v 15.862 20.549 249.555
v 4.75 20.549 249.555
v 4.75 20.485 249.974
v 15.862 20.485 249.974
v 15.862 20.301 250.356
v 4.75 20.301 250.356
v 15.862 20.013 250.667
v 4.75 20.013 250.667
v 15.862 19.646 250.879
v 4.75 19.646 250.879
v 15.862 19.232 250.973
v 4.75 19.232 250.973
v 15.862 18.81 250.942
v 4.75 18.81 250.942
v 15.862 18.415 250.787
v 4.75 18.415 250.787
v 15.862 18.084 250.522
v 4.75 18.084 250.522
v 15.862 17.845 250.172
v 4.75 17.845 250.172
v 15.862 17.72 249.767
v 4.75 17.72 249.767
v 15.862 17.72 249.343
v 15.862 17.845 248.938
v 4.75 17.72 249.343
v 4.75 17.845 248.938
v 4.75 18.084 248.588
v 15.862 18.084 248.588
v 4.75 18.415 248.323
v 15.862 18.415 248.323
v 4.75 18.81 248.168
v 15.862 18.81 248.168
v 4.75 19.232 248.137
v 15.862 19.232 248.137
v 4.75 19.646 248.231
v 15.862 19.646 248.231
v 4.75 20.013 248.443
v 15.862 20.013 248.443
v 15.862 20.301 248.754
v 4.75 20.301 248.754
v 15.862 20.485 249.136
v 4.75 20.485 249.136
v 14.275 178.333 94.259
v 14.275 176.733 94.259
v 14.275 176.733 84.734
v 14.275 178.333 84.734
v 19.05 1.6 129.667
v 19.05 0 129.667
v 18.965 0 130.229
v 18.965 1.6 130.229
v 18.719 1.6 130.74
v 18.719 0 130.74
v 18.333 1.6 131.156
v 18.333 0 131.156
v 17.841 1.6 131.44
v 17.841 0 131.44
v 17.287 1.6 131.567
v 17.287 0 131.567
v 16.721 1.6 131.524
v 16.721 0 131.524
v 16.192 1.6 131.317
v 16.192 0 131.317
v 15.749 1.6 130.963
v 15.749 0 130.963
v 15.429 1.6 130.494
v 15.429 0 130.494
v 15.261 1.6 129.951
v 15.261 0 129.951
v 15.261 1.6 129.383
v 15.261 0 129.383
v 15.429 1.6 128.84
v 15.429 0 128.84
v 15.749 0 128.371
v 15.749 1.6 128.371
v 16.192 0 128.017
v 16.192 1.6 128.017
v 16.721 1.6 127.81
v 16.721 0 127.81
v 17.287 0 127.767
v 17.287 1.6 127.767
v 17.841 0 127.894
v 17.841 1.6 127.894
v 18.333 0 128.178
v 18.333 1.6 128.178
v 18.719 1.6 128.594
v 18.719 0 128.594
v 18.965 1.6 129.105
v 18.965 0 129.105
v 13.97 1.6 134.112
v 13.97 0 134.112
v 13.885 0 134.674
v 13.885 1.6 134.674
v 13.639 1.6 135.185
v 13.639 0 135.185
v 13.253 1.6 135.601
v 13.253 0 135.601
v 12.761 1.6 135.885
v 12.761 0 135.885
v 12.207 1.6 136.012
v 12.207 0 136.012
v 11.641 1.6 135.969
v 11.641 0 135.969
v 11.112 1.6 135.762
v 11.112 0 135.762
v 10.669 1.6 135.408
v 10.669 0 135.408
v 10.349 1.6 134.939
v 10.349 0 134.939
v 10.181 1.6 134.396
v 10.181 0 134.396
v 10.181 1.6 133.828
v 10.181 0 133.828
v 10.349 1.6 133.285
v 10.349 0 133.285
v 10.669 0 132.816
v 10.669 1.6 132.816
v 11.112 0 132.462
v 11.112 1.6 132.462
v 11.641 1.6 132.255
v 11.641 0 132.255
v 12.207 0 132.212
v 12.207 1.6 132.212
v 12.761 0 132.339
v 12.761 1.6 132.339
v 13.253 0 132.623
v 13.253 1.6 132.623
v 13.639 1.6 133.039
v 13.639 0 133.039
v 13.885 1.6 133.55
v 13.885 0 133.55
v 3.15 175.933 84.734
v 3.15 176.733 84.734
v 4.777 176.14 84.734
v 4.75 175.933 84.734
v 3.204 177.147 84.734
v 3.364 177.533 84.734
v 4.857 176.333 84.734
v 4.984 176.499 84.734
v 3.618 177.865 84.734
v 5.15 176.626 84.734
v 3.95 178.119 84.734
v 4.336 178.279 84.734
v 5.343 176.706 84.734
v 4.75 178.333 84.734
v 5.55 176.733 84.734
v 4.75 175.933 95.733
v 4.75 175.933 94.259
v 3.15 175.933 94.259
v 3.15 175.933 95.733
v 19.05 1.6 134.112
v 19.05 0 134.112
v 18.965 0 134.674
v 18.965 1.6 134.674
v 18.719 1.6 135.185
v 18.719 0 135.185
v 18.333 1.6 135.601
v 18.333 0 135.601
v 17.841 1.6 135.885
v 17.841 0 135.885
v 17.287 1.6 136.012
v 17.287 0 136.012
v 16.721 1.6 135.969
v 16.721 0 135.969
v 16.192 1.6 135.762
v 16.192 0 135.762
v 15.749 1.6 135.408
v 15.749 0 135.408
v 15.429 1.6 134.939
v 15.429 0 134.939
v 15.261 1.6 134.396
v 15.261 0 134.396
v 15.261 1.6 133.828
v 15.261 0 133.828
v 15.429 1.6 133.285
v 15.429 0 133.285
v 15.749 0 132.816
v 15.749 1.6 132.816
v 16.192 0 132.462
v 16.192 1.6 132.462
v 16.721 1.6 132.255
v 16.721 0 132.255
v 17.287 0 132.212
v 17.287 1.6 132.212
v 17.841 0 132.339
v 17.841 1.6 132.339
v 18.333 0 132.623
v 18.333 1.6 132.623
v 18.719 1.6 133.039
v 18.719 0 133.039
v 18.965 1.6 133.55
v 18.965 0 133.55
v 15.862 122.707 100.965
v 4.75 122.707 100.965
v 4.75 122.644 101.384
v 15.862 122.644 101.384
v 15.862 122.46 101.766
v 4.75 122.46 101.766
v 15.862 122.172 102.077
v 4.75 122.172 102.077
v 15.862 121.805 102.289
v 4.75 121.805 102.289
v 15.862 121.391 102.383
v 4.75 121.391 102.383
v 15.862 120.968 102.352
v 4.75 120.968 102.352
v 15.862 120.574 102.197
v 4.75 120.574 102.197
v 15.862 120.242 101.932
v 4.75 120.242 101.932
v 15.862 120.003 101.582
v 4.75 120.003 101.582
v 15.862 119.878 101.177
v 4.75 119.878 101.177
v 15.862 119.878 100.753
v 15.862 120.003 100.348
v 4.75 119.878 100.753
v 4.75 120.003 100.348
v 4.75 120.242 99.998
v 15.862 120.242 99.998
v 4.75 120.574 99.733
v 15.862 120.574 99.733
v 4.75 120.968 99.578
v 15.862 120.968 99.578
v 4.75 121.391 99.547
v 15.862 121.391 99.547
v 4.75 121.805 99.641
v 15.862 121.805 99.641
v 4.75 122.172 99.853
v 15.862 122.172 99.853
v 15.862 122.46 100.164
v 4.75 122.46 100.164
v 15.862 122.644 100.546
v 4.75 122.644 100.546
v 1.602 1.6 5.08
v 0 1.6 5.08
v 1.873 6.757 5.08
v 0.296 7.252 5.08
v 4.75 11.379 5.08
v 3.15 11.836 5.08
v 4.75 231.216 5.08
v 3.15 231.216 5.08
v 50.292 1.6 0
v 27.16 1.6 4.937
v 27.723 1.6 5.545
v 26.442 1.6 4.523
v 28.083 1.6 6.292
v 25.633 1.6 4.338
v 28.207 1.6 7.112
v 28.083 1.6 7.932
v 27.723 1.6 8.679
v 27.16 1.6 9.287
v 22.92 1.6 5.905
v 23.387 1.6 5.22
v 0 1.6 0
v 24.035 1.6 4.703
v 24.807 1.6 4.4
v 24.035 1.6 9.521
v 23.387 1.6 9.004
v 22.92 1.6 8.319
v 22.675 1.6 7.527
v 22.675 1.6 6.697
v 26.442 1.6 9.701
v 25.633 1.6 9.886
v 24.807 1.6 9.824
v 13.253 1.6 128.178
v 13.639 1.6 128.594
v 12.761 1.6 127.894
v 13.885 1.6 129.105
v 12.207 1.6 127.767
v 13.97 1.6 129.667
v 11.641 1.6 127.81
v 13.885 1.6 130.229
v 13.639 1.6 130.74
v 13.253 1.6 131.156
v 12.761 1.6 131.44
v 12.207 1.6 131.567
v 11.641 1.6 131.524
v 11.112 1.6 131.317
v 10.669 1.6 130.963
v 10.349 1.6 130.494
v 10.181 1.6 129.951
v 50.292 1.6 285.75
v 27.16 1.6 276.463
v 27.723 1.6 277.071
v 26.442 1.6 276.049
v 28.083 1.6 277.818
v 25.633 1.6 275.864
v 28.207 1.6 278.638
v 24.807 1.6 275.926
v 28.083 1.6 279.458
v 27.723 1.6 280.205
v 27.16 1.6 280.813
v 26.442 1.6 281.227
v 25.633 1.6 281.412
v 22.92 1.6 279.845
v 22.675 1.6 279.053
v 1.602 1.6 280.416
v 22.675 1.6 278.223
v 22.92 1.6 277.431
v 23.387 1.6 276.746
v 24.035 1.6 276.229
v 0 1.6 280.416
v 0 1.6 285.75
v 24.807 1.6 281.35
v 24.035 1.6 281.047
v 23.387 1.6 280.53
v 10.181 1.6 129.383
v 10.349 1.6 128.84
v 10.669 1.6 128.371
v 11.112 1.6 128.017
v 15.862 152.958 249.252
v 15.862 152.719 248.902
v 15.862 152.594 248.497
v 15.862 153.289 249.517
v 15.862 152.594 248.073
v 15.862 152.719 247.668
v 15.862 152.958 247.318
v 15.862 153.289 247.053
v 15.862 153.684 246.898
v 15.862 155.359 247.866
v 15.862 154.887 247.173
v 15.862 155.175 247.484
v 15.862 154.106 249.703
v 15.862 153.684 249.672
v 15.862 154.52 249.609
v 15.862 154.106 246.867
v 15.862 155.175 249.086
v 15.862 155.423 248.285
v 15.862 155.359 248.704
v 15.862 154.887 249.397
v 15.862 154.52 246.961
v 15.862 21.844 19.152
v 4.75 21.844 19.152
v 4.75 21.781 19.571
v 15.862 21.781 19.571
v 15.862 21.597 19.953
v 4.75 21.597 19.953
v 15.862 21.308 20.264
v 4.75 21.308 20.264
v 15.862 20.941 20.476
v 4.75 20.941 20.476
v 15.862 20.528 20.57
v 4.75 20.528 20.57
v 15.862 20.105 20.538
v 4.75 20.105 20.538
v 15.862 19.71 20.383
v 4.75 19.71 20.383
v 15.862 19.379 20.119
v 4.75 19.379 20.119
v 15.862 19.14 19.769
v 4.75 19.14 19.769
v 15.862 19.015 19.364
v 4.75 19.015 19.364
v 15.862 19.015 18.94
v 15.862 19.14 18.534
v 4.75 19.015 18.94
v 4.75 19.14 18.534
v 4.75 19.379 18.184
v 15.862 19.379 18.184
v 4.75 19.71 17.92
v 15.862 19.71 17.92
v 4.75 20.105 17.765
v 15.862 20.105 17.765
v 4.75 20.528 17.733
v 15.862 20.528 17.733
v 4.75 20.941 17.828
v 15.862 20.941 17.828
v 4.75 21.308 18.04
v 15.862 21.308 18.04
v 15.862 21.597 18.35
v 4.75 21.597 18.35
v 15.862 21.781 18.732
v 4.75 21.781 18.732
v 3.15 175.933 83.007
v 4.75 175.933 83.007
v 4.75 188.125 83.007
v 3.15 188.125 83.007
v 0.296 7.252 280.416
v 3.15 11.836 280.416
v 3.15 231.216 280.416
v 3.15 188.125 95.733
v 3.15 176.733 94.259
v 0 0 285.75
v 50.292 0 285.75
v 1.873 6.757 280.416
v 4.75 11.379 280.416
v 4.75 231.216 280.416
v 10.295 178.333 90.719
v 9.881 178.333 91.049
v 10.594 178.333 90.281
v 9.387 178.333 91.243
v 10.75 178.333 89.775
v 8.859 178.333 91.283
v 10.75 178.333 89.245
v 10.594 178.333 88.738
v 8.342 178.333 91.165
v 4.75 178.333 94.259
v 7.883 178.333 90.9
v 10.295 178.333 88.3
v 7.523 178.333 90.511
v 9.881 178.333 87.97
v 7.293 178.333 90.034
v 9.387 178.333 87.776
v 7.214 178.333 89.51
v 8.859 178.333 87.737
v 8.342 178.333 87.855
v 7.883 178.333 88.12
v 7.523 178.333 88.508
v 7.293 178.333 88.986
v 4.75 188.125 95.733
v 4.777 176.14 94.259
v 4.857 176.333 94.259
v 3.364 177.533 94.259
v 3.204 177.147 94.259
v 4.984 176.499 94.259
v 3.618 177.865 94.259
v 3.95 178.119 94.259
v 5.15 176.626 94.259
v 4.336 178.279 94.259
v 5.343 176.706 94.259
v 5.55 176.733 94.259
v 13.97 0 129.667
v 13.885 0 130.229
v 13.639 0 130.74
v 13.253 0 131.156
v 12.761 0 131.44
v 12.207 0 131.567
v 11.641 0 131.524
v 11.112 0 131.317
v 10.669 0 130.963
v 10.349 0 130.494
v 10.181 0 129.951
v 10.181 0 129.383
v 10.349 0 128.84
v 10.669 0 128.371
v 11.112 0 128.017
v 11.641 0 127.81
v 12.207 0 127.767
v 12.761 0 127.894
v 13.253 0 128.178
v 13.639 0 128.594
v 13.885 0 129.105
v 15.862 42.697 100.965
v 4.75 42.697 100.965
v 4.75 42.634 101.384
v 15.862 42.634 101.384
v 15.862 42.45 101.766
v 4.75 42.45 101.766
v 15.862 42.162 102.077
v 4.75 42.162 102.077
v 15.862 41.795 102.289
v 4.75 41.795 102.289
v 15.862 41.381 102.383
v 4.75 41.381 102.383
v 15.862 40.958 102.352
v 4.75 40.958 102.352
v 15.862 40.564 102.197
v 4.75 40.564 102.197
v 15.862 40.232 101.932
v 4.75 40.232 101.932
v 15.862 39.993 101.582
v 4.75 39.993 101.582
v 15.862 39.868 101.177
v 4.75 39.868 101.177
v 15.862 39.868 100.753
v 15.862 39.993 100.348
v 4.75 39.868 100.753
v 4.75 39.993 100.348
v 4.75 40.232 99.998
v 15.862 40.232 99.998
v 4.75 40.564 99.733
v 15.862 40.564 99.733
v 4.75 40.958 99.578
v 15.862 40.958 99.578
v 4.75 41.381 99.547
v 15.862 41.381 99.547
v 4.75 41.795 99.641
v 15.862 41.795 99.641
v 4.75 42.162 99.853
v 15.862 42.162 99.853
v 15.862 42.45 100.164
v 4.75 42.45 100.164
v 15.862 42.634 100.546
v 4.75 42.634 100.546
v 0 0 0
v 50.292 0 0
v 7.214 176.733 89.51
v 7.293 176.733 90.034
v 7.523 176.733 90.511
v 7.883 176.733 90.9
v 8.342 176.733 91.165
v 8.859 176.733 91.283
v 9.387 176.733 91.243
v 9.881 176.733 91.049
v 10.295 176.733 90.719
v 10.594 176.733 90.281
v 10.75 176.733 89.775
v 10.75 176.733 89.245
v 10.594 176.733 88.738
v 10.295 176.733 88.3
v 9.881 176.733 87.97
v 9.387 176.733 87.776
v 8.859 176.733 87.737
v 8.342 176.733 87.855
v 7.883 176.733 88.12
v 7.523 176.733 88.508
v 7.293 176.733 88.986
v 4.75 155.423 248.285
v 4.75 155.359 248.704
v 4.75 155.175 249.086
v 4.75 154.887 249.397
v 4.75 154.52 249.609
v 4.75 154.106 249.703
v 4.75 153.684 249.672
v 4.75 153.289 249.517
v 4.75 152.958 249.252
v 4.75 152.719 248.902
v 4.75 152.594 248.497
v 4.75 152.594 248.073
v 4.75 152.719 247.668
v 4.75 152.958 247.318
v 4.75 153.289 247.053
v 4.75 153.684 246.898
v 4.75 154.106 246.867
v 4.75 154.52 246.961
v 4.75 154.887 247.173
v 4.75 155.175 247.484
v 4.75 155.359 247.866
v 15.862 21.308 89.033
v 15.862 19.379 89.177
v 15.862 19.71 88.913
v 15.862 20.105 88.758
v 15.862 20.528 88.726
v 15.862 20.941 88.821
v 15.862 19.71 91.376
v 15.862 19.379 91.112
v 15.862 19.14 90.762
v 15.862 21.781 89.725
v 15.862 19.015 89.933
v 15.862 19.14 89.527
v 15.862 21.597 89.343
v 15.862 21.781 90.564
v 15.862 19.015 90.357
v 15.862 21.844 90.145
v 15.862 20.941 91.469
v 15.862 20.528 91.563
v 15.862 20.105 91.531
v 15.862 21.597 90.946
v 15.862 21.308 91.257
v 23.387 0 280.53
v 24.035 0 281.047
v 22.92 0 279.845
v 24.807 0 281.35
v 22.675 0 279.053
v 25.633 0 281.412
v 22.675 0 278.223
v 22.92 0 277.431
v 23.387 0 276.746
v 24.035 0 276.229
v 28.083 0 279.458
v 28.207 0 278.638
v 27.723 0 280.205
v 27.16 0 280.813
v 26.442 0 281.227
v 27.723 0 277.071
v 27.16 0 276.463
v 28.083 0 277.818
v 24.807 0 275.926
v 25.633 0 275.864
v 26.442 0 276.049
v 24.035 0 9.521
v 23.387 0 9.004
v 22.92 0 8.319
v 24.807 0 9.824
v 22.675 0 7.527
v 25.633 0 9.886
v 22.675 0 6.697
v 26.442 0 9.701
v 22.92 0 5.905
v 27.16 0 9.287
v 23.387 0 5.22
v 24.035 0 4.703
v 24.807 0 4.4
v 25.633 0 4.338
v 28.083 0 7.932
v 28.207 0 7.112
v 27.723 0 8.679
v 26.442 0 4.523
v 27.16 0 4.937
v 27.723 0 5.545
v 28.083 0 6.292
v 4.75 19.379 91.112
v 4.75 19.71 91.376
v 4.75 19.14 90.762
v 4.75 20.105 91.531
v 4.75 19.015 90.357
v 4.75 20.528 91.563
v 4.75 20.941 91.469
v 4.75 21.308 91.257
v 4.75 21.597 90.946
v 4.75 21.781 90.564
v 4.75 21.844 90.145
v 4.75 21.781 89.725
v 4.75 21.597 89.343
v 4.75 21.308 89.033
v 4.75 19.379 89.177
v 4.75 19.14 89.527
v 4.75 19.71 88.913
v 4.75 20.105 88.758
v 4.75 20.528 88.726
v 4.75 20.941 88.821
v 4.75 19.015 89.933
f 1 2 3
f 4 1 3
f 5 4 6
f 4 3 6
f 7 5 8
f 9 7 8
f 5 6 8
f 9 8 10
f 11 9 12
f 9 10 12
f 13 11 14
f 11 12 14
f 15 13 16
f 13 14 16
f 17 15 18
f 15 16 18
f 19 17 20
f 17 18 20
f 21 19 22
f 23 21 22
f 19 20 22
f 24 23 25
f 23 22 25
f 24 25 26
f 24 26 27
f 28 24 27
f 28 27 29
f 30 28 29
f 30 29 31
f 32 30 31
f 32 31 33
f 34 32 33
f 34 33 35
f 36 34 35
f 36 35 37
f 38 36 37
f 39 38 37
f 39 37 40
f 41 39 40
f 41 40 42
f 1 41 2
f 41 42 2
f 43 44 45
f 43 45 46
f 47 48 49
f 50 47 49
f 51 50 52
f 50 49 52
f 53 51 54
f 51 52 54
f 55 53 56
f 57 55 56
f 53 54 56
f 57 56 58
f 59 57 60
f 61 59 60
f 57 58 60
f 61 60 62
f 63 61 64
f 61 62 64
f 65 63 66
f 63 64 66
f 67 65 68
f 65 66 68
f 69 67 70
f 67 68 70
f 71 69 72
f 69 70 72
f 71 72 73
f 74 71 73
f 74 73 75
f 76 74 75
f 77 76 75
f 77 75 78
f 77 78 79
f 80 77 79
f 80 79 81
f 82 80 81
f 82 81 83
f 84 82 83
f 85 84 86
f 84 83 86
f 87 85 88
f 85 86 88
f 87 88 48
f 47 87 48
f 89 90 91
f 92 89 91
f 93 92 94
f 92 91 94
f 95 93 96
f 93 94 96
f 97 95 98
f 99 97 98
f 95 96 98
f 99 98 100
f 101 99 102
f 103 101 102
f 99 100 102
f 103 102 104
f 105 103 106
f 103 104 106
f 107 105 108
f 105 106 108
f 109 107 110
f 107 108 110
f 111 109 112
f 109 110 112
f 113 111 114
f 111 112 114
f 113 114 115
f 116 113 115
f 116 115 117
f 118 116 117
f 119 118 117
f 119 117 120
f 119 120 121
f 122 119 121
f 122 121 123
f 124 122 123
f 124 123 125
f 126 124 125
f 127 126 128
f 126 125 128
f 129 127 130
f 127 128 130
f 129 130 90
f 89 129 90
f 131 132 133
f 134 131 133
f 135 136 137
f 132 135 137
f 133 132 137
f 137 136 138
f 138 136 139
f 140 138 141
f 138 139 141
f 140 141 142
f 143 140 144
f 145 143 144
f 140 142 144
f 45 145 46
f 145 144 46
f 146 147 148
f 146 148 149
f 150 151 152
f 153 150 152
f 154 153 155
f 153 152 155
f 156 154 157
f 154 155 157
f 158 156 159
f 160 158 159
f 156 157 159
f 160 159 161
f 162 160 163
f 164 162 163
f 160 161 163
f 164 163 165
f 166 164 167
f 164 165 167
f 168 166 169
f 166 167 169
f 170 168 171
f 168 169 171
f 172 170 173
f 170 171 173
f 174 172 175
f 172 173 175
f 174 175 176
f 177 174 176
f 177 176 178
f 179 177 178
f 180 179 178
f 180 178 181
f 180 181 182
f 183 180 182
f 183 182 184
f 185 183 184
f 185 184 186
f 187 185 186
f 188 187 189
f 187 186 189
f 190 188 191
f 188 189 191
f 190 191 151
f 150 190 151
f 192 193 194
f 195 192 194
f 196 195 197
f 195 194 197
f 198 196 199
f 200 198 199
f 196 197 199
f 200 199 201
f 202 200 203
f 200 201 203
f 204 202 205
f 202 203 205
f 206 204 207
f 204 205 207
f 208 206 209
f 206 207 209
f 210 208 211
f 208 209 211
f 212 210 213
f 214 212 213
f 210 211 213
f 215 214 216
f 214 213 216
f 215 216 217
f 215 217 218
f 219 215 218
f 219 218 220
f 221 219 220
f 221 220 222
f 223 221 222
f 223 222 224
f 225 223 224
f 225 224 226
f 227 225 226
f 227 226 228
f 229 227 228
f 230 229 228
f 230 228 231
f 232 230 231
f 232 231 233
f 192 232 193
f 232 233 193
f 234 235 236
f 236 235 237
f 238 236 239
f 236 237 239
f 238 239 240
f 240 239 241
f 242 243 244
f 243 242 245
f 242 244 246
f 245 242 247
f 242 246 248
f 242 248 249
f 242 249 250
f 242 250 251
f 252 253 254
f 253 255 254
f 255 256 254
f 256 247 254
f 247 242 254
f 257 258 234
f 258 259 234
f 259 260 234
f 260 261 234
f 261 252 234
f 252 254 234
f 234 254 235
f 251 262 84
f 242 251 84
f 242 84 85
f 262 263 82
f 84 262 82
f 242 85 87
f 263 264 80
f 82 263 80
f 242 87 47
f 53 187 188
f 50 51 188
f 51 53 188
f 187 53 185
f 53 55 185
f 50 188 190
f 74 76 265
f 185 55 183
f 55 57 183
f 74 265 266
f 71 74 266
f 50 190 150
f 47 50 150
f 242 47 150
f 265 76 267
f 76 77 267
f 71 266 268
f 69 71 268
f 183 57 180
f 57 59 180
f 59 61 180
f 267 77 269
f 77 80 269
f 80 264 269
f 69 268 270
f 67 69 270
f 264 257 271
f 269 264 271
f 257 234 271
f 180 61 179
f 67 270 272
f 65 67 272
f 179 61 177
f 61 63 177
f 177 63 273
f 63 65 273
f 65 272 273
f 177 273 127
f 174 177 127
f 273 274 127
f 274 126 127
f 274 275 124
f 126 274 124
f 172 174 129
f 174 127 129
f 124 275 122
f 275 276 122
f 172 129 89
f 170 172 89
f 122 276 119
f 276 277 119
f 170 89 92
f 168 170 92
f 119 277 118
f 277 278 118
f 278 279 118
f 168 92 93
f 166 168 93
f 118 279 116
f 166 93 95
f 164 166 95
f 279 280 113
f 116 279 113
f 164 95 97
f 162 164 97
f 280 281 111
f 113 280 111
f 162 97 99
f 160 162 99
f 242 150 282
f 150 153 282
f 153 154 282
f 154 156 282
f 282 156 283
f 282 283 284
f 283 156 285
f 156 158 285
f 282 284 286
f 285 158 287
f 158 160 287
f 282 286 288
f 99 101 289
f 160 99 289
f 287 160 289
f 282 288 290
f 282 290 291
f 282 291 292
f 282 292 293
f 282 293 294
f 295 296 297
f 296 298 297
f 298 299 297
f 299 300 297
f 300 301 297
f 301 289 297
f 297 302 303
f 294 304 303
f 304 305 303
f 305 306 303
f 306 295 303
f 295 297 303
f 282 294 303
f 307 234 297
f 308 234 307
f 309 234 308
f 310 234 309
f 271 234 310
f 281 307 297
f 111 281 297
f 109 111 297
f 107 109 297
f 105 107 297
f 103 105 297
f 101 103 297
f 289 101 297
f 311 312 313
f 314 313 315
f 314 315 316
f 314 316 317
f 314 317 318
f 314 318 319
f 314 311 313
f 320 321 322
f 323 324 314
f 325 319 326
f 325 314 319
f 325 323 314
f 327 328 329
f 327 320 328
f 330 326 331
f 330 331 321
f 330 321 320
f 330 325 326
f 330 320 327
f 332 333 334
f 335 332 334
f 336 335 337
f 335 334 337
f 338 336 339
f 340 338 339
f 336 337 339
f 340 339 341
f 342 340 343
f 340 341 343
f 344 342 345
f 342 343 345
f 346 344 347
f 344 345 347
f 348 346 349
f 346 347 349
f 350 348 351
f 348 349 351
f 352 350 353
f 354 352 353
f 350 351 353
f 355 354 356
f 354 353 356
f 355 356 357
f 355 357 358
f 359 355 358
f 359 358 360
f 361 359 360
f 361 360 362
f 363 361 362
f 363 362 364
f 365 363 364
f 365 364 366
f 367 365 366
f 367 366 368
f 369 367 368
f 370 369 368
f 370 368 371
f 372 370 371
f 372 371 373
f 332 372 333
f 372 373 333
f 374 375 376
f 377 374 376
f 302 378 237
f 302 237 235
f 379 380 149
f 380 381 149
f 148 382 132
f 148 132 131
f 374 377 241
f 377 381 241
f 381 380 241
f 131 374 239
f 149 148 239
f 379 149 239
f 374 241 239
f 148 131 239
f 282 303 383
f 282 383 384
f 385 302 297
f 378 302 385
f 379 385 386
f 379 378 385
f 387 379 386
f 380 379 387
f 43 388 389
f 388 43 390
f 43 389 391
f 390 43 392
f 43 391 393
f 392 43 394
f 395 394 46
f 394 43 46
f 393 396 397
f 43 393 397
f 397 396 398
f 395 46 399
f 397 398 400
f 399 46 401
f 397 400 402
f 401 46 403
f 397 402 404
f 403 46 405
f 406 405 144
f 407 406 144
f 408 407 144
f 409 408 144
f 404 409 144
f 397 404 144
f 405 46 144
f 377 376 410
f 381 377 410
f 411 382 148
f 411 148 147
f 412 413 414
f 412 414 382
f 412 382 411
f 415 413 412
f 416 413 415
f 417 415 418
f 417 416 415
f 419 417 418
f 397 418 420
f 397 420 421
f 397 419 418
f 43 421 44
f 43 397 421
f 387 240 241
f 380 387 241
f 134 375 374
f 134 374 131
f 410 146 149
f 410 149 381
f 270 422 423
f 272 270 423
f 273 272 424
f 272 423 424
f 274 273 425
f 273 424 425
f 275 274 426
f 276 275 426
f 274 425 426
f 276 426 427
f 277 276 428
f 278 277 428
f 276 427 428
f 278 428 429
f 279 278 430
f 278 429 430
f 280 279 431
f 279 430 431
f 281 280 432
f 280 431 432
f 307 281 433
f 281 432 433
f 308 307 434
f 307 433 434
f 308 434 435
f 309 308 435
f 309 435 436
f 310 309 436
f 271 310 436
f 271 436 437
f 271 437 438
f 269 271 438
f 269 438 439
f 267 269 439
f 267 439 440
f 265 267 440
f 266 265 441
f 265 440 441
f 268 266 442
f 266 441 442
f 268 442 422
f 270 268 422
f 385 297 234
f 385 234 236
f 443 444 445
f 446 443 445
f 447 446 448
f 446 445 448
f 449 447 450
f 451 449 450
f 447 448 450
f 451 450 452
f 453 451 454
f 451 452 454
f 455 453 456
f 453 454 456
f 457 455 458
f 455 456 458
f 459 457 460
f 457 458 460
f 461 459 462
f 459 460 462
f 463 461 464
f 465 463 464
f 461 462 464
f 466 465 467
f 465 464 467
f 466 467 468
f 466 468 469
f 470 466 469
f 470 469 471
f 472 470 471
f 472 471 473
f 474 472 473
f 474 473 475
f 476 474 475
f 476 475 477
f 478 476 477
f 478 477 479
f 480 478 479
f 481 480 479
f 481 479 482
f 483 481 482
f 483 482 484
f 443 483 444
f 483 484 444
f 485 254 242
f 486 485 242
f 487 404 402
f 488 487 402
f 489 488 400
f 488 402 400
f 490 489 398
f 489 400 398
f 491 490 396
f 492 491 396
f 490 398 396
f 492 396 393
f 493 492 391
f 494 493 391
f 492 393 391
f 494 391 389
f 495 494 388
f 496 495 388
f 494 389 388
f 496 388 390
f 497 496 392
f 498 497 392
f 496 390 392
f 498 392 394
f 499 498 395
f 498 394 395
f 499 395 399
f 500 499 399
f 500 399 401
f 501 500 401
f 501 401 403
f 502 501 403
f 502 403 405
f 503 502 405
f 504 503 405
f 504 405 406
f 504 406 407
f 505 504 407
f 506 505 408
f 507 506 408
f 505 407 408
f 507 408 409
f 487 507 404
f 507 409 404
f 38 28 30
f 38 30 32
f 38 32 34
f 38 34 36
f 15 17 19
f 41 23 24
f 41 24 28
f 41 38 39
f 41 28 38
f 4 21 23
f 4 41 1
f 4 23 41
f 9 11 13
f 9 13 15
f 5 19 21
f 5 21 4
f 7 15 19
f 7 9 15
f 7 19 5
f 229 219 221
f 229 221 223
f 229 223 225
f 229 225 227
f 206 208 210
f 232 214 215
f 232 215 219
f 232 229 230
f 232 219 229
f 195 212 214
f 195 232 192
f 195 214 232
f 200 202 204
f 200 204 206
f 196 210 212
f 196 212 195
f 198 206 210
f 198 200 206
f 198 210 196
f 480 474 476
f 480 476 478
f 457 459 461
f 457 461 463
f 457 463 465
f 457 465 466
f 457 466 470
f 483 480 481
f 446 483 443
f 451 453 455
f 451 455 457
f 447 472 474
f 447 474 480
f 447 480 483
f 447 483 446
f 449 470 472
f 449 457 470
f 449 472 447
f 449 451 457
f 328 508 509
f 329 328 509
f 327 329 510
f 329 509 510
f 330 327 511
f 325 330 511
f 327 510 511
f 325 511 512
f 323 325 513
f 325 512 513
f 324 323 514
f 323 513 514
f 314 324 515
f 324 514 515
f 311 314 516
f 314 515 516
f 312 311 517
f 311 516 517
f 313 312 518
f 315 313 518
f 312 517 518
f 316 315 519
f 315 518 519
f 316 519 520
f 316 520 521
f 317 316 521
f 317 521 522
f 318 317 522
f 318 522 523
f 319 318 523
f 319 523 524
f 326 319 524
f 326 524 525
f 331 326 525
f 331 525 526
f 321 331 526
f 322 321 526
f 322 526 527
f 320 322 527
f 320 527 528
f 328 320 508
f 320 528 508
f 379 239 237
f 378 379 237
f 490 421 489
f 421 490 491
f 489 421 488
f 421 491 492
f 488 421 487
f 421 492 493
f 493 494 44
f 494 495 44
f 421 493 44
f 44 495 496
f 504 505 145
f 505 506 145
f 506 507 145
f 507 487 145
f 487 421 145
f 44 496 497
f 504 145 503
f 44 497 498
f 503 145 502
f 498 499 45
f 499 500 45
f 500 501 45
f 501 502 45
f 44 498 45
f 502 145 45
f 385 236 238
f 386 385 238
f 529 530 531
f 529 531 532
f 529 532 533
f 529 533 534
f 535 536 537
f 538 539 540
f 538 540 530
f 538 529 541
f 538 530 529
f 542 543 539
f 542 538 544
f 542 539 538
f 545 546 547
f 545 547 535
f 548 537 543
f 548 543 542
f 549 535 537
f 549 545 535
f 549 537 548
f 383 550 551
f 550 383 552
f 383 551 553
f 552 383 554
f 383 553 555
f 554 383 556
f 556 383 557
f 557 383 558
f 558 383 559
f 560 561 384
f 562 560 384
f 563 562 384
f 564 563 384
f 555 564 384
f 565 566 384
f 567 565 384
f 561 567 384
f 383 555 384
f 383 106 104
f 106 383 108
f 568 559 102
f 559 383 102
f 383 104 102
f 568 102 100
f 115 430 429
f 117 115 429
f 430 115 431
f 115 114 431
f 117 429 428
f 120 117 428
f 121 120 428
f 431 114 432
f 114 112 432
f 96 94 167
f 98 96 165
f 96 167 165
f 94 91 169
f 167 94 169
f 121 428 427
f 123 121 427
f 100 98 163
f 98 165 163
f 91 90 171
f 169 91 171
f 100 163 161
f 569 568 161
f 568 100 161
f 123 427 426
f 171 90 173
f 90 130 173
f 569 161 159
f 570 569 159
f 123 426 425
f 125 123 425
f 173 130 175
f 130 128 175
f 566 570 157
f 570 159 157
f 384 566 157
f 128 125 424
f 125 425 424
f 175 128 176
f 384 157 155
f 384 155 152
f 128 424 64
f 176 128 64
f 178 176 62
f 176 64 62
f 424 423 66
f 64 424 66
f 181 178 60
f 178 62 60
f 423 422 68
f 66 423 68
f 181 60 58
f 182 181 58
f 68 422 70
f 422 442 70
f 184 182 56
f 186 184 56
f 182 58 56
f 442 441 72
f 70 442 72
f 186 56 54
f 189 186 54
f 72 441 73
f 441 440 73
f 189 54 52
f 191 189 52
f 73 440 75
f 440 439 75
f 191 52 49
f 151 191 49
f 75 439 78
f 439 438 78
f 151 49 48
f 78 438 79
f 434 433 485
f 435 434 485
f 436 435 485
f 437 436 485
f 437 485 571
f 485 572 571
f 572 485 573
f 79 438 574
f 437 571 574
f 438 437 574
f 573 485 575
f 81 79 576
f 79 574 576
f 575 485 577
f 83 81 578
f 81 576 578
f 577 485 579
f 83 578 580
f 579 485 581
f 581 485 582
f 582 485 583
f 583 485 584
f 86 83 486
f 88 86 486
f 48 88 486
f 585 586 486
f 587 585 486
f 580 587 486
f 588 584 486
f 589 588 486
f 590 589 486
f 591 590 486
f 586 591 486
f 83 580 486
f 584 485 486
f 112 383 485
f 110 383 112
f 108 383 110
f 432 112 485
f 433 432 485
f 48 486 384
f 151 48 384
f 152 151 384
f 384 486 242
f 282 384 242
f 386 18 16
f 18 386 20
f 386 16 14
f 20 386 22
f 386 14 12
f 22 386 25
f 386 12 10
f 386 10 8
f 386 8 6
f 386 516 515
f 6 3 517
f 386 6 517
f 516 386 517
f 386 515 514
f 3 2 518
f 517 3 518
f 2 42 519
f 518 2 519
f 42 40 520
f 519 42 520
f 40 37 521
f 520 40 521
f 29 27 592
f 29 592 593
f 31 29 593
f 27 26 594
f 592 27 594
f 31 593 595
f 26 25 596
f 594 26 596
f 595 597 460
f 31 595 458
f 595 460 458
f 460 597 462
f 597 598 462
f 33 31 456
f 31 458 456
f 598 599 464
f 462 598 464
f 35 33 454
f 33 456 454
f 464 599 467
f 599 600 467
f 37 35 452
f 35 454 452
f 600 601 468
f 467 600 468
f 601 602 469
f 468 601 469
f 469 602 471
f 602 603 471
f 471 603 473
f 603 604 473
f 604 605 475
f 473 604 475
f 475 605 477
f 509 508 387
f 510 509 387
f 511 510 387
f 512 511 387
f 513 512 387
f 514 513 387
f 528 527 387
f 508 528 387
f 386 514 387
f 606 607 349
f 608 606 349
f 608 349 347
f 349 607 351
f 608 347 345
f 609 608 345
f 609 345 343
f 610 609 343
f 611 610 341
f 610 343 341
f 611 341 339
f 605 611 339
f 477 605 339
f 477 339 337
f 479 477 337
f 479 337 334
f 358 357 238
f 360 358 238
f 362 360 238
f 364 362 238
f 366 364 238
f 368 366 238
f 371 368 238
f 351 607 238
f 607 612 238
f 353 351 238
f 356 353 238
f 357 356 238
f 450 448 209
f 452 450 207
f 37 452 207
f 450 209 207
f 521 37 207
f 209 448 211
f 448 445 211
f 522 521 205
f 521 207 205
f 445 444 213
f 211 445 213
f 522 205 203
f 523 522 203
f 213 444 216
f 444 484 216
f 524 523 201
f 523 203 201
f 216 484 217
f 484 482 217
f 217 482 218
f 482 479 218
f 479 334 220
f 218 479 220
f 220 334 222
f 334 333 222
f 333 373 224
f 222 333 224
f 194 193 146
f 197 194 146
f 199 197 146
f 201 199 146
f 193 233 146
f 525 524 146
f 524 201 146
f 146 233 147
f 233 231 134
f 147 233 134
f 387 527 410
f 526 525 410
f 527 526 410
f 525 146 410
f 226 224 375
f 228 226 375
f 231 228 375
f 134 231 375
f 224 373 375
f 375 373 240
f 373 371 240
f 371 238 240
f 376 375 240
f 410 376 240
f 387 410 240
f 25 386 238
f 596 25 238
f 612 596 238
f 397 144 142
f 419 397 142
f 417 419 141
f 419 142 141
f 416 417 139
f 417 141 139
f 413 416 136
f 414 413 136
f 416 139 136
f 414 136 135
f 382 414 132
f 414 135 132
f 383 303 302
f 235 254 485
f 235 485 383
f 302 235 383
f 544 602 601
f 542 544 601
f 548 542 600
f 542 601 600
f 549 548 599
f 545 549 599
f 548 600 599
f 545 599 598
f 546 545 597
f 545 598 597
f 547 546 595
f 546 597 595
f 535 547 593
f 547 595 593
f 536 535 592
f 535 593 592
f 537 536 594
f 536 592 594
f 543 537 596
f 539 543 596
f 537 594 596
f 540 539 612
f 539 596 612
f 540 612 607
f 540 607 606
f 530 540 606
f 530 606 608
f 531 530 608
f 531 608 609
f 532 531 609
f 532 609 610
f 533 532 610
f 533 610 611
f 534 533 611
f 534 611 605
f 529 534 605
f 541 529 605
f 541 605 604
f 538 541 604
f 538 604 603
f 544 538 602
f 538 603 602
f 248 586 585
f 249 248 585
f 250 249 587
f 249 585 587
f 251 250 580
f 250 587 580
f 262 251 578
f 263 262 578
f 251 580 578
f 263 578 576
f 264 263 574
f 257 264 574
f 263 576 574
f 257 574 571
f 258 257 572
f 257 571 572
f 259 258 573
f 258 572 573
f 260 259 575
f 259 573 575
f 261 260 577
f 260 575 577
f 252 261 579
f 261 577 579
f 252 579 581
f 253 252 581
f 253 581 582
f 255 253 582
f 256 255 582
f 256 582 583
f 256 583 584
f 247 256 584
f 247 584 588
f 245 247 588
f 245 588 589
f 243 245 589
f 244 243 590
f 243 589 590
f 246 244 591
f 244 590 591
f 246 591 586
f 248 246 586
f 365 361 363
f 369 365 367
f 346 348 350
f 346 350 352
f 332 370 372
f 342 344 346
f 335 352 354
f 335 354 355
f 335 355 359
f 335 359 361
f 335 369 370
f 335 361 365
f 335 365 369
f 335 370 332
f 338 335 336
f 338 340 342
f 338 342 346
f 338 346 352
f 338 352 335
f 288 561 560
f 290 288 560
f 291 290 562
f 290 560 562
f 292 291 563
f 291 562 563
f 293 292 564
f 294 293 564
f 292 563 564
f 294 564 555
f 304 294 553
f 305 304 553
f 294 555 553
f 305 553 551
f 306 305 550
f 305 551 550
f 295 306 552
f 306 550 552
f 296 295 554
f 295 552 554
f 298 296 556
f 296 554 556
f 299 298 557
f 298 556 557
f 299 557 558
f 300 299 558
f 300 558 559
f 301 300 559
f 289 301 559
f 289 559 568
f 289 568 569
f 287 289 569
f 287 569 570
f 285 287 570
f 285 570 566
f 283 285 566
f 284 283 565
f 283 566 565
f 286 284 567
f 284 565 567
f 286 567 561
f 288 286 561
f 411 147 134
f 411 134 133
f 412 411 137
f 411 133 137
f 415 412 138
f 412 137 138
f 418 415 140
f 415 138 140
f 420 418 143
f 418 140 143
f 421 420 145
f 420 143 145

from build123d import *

# Parameters (mm, degrees)
F1_DEPTH  = 285.75
F2_W      = 229.616
F2_H      = 5.08
F3_DEPTH  = 6.35
F4_W      = 229.616
F4_H      = 5.334
F5_DEPTH  = 6.35
F6_R      = 1.4224
F7_DEPTH  = 11.1125
F8_W      = 12.192
F8_H      = 12.7254
F9_DEPTH  = 25.4
F12_DEPTH = 9.525
F13_R     = 1.778
F14_DEPTH = 1.6002
F15_R     = 1.905
F16_DEPTH = 1.6002
F17_R     = 2.7813
F18_DEPTH = 1.6002


with BuildPart() as f1:
    # F0 (on Top) → F1 (new body)
    with BuildSketch(Plane.XY):
        Polygon((0, 1.6002), (0, 0), (50.292, 0), (50.292, 1.6002), (1.602396, 1.6002), (1.872637, 6.756705), (4.7498, 11.379061), (4.7498, 231.2162), (3.1496, 231.2162), (3.1496, 11.8364), (0.296211, 7.252239), align=None)
    extrude(amount=F1_DEPTH)

    # F2 (on Right) → F3 (cut)
    with BuildSketch(Plane.YZ):
        with Locations((116.4082, 2.54)):
            Rectangle(F2_W, F2_H)
    extrude(amount=F3_DEPTH, mode=Mode.SUBTRACT)

    # F4 (on Right) → F5 (cut)
    with BuildSketch(Plane.YZ):
        with Locations((116.4082, 283.083)):
            Rectangle(F4_W, F4_H)
    extrude(amount=F5_DEPTH, mode=Mode.SUBTRACT)

    # F6 (on face) → F7 (join)
    with BuildSketch(Plane.YZ.offset(4.7498)):
        with Locations((154.0002, 248.285)):
            Circle(F6_R)
        with Locations((19.1262, 249.555)):
            Circle(F6_R)
        with Locations((121.285, 100.965)):
            Circle(F6_R)
        with Locations((20.4216, 90.1446)):
            Circle(F6_R)
        with Locations((41.275, 100.965)):
            Circle(F6_R)
        with Locations((20.4216, 19.1516)):
            Circle(F6_R)
    extrude(amount=F7_DEPTH)

    # F8 (on face) → F9 (cut)
    with BuildSketch(Plane.YZ.offset(4.7498)):
        with Locations((182.0291, 89.3699)):
            Rectangle(F8_W, F8_H)
    extrude(amount=-F9_DEPTH, mode=Mode.SUBTRACT)

    # F11 (on offset) → F12 (join)
    with BuildSketch(Plane.XY.offset(84.7344)):
        with BuildLine():
            Line((14.2748, 176.7332), (14.2748, 178.3334))
            Line((14.2748, 178.3334), (4.7498, 178.3334))
            ThreePointArc((4.7498, 178.3334), (3.618288, 177.864712), (3.1496, 176.7332))
            Line((3.1496, 176.7332), (3.1496, 175.9331))
            Line((3.1496, 175.9331), (4.7498, 175.9331))
            ThreePointArc((4.7498, 175.9331), (4.984144, 176.498856), (5.5499, 176.7332))
            Line((5.5499, 176.7332), (14.2748, 176.7332))
        make_face()
    extrude(amount=F12_DEPTH)

    # F13 (on face) → F14 (cut, through all)
    with BuildSketch(Plane(origin=(0, 178.3334, 0), x_dir=(-1, 0, 0), z_dir=(0, 1, 0))):
        with Locations((-8.9916, 89.5096)):
            Circle(F13_R)
    extrude(amount=-F14_DEPTH, mode=Mode.SUBTRACT)

    # F15 (on face) → F16 (cut, through all)
    with BuildSketch(Plane.XZ):
        with Locations((12.065, 134.112)):
            Circle(F15_R)
        with Locations((17.145, 134.112)):
            Circle(F15_R)
        with Locations((12.065, 129.667)):
            Circle(F15_R)
        with Locations((17.145, 129.667)):
            Circle(F15_R)
    extrude(amount=-F16_DEPTH, mode=Mode.SUBTRACT)

    # F17 (on face) → F18 (cut, through all)
    with BuildSketch(Plane.XZ):
        with Locations((25.4254, 7.112)):
            Circle(F17_R)
        with Locations((25.4254, 278.638)):
            Circle(F17_R)
    extrude(amount=-F18_DEPTH, mode=Mode.SUBTRACT)


solid = f1.part
